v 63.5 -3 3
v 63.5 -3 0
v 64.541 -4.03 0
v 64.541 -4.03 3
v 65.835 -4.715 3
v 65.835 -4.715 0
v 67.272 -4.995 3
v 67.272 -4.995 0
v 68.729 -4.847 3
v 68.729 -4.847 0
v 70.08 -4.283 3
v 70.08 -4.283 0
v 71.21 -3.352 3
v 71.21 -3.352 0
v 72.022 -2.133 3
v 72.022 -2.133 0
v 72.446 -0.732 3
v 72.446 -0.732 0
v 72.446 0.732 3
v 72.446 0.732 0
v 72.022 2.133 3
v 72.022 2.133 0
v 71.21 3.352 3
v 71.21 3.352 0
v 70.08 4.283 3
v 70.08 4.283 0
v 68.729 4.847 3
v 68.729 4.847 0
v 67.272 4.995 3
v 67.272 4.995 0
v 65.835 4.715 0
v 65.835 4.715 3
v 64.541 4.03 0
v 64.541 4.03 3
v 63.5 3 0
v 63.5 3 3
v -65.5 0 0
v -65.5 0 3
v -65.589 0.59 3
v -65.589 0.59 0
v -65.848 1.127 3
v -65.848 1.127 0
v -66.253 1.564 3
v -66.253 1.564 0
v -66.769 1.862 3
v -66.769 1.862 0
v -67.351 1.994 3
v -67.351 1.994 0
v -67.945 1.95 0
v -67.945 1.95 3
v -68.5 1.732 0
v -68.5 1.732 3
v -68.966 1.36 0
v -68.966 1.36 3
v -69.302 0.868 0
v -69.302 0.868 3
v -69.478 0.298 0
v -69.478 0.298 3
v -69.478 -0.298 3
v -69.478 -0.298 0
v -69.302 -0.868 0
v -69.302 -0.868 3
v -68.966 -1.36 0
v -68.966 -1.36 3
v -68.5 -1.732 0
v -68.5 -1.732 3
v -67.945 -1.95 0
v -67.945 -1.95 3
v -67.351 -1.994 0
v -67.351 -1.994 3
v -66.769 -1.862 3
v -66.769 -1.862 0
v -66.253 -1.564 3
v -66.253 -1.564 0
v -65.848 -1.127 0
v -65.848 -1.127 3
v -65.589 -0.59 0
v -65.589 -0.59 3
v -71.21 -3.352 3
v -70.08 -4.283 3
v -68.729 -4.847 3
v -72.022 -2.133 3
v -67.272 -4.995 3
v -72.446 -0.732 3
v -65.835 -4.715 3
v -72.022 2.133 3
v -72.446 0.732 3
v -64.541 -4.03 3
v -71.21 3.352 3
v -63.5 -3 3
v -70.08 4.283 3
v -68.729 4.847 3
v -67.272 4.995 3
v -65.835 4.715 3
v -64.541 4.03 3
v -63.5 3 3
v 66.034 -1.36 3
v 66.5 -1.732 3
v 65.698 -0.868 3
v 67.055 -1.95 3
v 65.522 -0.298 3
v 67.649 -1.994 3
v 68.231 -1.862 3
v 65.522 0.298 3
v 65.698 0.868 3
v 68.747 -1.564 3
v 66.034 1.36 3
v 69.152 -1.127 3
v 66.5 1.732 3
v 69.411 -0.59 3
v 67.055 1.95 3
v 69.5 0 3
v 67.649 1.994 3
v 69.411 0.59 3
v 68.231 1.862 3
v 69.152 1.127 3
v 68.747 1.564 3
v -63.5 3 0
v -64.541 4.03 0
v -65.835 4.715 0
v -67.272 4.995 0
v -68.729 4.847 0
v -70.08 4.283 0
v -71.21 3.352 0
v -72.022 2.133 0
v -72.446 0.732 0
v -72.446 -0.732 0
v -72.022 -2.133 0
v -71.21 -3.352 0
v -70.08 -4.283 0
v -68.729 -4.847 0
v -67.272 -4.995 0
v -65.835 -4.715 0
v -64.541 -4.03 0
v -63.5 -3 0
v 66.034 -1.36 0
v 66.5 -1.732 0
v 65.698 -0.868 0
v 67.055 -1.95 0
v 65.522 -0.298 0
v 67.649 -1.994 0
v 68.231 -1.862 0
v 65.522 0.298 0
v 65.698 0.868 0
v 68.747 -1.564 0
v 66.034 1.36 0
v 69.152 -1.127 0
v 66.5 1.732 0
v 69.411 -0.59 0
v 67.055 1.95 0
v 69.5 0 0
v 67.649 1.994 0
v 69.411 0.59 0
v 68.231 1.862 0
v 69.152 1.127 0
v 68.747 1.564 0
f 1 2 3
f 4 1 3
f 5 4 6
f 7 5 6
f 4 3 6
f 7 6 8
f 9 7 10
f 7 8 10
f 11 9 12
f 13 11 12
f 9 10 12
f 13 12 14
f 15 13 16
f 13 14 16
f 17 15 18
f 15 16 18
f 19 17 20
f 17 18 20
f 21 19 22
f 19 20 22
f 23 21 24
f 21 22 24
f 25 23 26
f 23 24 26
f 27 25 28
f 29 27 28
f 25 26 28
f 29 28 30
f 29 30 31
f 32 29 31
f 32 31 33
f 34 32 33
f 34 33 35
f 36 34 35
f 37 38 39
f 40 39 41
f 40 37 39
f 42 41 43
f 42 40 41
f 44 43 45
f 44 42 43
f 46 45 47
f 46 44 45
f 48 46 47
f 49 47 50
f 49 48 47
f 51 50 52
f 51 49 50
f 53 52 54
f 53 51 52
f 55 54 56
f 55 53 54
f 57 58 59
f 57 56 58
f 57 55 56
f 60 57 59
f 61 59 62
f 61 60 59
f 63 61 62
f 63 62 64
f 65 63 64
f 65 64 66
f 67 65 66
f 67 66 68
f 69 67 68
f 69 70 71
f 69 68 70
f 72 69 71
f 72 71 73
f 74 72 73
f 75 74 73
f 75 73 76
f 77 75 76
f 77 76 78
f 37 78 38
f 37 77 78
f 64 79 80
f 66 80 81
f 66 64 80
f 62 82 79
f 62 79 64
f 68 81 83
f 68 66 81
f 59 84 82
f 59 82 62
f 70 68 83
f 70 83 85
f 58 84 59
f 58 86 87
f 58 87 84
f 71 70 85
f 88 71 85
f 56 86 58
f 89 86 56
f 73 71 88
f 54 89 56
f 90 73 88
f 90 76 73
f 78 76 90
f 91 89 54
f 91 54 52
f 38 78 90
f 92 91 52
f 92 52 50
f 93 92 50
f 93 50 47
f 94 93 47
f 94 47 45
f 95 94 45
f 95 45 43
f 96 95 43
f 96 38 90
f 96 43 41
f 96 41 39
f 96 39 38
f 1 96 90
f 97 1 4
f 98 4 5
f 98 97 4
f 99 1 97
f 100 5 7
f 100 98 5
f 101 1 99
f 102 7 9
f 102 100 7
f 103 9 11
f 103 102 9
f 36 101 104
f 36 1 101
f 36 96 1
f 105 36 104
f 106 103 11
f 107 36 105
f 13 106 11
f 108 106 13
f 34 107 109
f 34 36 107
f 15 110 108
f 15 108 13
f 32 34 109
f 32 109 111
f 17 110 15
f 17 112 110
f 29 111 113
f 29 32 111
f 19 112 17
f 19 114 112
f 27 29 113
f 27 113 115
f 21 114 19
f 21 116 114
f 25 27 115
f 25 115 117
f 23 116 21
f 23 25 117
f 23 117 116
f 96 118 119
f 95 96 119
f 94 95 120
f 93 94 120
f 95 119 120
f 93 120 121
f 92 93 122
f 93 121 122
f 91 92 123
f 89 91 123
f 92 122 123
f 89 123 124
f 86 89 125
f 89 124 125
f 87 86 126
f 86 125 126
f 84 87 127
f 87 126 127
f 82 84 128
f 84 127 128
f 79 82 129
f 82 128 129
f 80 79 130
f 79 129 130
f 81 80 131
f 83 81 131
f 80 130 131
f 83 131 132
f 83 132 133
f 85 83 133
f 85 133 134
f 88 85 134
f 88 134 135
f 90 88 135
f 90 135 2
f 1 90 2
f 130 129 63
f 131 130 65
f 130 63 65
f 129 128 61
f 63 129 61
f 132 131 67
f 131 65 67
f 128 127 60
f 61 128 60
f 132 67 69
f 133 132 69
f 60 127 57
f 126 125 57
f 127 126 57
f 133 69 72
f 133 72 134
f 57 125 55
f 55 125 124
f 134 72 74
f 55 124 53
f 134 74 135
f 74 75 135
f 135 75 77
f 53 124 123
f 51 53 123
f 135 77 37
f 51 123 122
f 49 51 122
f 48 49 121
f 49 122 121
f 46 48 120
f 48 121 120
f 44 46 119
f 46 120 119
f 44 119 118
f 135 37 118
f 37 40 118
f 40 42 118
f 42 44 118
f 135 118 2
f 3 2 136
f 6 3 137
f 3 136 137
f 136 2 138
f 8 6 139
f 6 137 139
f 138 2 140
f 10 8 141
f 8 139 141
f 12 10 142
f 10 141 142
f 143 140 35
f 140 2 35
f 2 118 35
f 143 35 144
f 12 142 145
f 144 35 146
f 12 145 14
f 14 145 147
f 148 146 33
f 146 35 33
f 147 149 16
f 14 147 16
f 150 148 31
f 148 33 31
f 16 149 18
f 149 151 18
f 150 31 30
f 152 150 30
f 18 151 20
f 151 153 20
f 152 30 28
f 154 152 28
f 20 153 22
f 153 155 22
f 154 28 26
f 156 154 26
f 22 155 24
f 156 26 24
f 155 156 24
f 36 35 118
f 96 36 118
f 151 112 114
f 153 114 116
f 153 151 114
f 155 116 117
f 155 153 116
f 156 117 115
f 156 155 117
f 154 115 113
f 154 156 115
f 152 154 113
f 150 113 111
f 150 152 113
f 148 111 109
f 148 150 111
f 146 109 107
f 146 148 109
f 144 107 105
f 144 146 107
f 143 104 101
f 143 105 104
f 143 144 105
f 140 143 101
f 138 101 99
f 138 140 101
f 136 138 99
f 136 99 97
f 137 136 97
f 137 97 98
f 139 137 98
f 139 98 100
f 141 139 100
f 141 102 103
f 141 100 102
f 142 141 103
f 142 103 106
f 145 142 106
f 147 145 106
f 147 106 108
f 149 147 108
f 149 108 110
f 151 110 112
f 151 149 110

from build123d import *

# Parameters (mm, degrees)
F1_DEPTH = 3
F2_R     = 2
F3_DEPTH = 25


with BuildPart() as f1:
    # F0 (on Top) → F1 (new body)
    with BuildSketch(Plane.XY):
        with BuildLine():
            Line((63.5, 3), (-63.5, 3))
            ThreePointArc((-63.5, 3), (-72.5, 0), (-63.5, -3))
            Line((-63.5, -3), (63.5, -3))
            ThreePointArc((63.5, -3), (72.5, 0), (63.5, 3))
        make_face()
    extrude(amount=F1_DEPTH)

    # F2 (on Top) → F3 (cut)
    with BuildSketch(Plane.XY):
        with Locations((67.5, 0)):
            Circle(F2_R)
        with Locations((-67.5, 0)):
            Circle(F2_R)
    extrude(amount=F3_DEPTH, mode=Mode.SUBTRACT)


solid = f1.part
